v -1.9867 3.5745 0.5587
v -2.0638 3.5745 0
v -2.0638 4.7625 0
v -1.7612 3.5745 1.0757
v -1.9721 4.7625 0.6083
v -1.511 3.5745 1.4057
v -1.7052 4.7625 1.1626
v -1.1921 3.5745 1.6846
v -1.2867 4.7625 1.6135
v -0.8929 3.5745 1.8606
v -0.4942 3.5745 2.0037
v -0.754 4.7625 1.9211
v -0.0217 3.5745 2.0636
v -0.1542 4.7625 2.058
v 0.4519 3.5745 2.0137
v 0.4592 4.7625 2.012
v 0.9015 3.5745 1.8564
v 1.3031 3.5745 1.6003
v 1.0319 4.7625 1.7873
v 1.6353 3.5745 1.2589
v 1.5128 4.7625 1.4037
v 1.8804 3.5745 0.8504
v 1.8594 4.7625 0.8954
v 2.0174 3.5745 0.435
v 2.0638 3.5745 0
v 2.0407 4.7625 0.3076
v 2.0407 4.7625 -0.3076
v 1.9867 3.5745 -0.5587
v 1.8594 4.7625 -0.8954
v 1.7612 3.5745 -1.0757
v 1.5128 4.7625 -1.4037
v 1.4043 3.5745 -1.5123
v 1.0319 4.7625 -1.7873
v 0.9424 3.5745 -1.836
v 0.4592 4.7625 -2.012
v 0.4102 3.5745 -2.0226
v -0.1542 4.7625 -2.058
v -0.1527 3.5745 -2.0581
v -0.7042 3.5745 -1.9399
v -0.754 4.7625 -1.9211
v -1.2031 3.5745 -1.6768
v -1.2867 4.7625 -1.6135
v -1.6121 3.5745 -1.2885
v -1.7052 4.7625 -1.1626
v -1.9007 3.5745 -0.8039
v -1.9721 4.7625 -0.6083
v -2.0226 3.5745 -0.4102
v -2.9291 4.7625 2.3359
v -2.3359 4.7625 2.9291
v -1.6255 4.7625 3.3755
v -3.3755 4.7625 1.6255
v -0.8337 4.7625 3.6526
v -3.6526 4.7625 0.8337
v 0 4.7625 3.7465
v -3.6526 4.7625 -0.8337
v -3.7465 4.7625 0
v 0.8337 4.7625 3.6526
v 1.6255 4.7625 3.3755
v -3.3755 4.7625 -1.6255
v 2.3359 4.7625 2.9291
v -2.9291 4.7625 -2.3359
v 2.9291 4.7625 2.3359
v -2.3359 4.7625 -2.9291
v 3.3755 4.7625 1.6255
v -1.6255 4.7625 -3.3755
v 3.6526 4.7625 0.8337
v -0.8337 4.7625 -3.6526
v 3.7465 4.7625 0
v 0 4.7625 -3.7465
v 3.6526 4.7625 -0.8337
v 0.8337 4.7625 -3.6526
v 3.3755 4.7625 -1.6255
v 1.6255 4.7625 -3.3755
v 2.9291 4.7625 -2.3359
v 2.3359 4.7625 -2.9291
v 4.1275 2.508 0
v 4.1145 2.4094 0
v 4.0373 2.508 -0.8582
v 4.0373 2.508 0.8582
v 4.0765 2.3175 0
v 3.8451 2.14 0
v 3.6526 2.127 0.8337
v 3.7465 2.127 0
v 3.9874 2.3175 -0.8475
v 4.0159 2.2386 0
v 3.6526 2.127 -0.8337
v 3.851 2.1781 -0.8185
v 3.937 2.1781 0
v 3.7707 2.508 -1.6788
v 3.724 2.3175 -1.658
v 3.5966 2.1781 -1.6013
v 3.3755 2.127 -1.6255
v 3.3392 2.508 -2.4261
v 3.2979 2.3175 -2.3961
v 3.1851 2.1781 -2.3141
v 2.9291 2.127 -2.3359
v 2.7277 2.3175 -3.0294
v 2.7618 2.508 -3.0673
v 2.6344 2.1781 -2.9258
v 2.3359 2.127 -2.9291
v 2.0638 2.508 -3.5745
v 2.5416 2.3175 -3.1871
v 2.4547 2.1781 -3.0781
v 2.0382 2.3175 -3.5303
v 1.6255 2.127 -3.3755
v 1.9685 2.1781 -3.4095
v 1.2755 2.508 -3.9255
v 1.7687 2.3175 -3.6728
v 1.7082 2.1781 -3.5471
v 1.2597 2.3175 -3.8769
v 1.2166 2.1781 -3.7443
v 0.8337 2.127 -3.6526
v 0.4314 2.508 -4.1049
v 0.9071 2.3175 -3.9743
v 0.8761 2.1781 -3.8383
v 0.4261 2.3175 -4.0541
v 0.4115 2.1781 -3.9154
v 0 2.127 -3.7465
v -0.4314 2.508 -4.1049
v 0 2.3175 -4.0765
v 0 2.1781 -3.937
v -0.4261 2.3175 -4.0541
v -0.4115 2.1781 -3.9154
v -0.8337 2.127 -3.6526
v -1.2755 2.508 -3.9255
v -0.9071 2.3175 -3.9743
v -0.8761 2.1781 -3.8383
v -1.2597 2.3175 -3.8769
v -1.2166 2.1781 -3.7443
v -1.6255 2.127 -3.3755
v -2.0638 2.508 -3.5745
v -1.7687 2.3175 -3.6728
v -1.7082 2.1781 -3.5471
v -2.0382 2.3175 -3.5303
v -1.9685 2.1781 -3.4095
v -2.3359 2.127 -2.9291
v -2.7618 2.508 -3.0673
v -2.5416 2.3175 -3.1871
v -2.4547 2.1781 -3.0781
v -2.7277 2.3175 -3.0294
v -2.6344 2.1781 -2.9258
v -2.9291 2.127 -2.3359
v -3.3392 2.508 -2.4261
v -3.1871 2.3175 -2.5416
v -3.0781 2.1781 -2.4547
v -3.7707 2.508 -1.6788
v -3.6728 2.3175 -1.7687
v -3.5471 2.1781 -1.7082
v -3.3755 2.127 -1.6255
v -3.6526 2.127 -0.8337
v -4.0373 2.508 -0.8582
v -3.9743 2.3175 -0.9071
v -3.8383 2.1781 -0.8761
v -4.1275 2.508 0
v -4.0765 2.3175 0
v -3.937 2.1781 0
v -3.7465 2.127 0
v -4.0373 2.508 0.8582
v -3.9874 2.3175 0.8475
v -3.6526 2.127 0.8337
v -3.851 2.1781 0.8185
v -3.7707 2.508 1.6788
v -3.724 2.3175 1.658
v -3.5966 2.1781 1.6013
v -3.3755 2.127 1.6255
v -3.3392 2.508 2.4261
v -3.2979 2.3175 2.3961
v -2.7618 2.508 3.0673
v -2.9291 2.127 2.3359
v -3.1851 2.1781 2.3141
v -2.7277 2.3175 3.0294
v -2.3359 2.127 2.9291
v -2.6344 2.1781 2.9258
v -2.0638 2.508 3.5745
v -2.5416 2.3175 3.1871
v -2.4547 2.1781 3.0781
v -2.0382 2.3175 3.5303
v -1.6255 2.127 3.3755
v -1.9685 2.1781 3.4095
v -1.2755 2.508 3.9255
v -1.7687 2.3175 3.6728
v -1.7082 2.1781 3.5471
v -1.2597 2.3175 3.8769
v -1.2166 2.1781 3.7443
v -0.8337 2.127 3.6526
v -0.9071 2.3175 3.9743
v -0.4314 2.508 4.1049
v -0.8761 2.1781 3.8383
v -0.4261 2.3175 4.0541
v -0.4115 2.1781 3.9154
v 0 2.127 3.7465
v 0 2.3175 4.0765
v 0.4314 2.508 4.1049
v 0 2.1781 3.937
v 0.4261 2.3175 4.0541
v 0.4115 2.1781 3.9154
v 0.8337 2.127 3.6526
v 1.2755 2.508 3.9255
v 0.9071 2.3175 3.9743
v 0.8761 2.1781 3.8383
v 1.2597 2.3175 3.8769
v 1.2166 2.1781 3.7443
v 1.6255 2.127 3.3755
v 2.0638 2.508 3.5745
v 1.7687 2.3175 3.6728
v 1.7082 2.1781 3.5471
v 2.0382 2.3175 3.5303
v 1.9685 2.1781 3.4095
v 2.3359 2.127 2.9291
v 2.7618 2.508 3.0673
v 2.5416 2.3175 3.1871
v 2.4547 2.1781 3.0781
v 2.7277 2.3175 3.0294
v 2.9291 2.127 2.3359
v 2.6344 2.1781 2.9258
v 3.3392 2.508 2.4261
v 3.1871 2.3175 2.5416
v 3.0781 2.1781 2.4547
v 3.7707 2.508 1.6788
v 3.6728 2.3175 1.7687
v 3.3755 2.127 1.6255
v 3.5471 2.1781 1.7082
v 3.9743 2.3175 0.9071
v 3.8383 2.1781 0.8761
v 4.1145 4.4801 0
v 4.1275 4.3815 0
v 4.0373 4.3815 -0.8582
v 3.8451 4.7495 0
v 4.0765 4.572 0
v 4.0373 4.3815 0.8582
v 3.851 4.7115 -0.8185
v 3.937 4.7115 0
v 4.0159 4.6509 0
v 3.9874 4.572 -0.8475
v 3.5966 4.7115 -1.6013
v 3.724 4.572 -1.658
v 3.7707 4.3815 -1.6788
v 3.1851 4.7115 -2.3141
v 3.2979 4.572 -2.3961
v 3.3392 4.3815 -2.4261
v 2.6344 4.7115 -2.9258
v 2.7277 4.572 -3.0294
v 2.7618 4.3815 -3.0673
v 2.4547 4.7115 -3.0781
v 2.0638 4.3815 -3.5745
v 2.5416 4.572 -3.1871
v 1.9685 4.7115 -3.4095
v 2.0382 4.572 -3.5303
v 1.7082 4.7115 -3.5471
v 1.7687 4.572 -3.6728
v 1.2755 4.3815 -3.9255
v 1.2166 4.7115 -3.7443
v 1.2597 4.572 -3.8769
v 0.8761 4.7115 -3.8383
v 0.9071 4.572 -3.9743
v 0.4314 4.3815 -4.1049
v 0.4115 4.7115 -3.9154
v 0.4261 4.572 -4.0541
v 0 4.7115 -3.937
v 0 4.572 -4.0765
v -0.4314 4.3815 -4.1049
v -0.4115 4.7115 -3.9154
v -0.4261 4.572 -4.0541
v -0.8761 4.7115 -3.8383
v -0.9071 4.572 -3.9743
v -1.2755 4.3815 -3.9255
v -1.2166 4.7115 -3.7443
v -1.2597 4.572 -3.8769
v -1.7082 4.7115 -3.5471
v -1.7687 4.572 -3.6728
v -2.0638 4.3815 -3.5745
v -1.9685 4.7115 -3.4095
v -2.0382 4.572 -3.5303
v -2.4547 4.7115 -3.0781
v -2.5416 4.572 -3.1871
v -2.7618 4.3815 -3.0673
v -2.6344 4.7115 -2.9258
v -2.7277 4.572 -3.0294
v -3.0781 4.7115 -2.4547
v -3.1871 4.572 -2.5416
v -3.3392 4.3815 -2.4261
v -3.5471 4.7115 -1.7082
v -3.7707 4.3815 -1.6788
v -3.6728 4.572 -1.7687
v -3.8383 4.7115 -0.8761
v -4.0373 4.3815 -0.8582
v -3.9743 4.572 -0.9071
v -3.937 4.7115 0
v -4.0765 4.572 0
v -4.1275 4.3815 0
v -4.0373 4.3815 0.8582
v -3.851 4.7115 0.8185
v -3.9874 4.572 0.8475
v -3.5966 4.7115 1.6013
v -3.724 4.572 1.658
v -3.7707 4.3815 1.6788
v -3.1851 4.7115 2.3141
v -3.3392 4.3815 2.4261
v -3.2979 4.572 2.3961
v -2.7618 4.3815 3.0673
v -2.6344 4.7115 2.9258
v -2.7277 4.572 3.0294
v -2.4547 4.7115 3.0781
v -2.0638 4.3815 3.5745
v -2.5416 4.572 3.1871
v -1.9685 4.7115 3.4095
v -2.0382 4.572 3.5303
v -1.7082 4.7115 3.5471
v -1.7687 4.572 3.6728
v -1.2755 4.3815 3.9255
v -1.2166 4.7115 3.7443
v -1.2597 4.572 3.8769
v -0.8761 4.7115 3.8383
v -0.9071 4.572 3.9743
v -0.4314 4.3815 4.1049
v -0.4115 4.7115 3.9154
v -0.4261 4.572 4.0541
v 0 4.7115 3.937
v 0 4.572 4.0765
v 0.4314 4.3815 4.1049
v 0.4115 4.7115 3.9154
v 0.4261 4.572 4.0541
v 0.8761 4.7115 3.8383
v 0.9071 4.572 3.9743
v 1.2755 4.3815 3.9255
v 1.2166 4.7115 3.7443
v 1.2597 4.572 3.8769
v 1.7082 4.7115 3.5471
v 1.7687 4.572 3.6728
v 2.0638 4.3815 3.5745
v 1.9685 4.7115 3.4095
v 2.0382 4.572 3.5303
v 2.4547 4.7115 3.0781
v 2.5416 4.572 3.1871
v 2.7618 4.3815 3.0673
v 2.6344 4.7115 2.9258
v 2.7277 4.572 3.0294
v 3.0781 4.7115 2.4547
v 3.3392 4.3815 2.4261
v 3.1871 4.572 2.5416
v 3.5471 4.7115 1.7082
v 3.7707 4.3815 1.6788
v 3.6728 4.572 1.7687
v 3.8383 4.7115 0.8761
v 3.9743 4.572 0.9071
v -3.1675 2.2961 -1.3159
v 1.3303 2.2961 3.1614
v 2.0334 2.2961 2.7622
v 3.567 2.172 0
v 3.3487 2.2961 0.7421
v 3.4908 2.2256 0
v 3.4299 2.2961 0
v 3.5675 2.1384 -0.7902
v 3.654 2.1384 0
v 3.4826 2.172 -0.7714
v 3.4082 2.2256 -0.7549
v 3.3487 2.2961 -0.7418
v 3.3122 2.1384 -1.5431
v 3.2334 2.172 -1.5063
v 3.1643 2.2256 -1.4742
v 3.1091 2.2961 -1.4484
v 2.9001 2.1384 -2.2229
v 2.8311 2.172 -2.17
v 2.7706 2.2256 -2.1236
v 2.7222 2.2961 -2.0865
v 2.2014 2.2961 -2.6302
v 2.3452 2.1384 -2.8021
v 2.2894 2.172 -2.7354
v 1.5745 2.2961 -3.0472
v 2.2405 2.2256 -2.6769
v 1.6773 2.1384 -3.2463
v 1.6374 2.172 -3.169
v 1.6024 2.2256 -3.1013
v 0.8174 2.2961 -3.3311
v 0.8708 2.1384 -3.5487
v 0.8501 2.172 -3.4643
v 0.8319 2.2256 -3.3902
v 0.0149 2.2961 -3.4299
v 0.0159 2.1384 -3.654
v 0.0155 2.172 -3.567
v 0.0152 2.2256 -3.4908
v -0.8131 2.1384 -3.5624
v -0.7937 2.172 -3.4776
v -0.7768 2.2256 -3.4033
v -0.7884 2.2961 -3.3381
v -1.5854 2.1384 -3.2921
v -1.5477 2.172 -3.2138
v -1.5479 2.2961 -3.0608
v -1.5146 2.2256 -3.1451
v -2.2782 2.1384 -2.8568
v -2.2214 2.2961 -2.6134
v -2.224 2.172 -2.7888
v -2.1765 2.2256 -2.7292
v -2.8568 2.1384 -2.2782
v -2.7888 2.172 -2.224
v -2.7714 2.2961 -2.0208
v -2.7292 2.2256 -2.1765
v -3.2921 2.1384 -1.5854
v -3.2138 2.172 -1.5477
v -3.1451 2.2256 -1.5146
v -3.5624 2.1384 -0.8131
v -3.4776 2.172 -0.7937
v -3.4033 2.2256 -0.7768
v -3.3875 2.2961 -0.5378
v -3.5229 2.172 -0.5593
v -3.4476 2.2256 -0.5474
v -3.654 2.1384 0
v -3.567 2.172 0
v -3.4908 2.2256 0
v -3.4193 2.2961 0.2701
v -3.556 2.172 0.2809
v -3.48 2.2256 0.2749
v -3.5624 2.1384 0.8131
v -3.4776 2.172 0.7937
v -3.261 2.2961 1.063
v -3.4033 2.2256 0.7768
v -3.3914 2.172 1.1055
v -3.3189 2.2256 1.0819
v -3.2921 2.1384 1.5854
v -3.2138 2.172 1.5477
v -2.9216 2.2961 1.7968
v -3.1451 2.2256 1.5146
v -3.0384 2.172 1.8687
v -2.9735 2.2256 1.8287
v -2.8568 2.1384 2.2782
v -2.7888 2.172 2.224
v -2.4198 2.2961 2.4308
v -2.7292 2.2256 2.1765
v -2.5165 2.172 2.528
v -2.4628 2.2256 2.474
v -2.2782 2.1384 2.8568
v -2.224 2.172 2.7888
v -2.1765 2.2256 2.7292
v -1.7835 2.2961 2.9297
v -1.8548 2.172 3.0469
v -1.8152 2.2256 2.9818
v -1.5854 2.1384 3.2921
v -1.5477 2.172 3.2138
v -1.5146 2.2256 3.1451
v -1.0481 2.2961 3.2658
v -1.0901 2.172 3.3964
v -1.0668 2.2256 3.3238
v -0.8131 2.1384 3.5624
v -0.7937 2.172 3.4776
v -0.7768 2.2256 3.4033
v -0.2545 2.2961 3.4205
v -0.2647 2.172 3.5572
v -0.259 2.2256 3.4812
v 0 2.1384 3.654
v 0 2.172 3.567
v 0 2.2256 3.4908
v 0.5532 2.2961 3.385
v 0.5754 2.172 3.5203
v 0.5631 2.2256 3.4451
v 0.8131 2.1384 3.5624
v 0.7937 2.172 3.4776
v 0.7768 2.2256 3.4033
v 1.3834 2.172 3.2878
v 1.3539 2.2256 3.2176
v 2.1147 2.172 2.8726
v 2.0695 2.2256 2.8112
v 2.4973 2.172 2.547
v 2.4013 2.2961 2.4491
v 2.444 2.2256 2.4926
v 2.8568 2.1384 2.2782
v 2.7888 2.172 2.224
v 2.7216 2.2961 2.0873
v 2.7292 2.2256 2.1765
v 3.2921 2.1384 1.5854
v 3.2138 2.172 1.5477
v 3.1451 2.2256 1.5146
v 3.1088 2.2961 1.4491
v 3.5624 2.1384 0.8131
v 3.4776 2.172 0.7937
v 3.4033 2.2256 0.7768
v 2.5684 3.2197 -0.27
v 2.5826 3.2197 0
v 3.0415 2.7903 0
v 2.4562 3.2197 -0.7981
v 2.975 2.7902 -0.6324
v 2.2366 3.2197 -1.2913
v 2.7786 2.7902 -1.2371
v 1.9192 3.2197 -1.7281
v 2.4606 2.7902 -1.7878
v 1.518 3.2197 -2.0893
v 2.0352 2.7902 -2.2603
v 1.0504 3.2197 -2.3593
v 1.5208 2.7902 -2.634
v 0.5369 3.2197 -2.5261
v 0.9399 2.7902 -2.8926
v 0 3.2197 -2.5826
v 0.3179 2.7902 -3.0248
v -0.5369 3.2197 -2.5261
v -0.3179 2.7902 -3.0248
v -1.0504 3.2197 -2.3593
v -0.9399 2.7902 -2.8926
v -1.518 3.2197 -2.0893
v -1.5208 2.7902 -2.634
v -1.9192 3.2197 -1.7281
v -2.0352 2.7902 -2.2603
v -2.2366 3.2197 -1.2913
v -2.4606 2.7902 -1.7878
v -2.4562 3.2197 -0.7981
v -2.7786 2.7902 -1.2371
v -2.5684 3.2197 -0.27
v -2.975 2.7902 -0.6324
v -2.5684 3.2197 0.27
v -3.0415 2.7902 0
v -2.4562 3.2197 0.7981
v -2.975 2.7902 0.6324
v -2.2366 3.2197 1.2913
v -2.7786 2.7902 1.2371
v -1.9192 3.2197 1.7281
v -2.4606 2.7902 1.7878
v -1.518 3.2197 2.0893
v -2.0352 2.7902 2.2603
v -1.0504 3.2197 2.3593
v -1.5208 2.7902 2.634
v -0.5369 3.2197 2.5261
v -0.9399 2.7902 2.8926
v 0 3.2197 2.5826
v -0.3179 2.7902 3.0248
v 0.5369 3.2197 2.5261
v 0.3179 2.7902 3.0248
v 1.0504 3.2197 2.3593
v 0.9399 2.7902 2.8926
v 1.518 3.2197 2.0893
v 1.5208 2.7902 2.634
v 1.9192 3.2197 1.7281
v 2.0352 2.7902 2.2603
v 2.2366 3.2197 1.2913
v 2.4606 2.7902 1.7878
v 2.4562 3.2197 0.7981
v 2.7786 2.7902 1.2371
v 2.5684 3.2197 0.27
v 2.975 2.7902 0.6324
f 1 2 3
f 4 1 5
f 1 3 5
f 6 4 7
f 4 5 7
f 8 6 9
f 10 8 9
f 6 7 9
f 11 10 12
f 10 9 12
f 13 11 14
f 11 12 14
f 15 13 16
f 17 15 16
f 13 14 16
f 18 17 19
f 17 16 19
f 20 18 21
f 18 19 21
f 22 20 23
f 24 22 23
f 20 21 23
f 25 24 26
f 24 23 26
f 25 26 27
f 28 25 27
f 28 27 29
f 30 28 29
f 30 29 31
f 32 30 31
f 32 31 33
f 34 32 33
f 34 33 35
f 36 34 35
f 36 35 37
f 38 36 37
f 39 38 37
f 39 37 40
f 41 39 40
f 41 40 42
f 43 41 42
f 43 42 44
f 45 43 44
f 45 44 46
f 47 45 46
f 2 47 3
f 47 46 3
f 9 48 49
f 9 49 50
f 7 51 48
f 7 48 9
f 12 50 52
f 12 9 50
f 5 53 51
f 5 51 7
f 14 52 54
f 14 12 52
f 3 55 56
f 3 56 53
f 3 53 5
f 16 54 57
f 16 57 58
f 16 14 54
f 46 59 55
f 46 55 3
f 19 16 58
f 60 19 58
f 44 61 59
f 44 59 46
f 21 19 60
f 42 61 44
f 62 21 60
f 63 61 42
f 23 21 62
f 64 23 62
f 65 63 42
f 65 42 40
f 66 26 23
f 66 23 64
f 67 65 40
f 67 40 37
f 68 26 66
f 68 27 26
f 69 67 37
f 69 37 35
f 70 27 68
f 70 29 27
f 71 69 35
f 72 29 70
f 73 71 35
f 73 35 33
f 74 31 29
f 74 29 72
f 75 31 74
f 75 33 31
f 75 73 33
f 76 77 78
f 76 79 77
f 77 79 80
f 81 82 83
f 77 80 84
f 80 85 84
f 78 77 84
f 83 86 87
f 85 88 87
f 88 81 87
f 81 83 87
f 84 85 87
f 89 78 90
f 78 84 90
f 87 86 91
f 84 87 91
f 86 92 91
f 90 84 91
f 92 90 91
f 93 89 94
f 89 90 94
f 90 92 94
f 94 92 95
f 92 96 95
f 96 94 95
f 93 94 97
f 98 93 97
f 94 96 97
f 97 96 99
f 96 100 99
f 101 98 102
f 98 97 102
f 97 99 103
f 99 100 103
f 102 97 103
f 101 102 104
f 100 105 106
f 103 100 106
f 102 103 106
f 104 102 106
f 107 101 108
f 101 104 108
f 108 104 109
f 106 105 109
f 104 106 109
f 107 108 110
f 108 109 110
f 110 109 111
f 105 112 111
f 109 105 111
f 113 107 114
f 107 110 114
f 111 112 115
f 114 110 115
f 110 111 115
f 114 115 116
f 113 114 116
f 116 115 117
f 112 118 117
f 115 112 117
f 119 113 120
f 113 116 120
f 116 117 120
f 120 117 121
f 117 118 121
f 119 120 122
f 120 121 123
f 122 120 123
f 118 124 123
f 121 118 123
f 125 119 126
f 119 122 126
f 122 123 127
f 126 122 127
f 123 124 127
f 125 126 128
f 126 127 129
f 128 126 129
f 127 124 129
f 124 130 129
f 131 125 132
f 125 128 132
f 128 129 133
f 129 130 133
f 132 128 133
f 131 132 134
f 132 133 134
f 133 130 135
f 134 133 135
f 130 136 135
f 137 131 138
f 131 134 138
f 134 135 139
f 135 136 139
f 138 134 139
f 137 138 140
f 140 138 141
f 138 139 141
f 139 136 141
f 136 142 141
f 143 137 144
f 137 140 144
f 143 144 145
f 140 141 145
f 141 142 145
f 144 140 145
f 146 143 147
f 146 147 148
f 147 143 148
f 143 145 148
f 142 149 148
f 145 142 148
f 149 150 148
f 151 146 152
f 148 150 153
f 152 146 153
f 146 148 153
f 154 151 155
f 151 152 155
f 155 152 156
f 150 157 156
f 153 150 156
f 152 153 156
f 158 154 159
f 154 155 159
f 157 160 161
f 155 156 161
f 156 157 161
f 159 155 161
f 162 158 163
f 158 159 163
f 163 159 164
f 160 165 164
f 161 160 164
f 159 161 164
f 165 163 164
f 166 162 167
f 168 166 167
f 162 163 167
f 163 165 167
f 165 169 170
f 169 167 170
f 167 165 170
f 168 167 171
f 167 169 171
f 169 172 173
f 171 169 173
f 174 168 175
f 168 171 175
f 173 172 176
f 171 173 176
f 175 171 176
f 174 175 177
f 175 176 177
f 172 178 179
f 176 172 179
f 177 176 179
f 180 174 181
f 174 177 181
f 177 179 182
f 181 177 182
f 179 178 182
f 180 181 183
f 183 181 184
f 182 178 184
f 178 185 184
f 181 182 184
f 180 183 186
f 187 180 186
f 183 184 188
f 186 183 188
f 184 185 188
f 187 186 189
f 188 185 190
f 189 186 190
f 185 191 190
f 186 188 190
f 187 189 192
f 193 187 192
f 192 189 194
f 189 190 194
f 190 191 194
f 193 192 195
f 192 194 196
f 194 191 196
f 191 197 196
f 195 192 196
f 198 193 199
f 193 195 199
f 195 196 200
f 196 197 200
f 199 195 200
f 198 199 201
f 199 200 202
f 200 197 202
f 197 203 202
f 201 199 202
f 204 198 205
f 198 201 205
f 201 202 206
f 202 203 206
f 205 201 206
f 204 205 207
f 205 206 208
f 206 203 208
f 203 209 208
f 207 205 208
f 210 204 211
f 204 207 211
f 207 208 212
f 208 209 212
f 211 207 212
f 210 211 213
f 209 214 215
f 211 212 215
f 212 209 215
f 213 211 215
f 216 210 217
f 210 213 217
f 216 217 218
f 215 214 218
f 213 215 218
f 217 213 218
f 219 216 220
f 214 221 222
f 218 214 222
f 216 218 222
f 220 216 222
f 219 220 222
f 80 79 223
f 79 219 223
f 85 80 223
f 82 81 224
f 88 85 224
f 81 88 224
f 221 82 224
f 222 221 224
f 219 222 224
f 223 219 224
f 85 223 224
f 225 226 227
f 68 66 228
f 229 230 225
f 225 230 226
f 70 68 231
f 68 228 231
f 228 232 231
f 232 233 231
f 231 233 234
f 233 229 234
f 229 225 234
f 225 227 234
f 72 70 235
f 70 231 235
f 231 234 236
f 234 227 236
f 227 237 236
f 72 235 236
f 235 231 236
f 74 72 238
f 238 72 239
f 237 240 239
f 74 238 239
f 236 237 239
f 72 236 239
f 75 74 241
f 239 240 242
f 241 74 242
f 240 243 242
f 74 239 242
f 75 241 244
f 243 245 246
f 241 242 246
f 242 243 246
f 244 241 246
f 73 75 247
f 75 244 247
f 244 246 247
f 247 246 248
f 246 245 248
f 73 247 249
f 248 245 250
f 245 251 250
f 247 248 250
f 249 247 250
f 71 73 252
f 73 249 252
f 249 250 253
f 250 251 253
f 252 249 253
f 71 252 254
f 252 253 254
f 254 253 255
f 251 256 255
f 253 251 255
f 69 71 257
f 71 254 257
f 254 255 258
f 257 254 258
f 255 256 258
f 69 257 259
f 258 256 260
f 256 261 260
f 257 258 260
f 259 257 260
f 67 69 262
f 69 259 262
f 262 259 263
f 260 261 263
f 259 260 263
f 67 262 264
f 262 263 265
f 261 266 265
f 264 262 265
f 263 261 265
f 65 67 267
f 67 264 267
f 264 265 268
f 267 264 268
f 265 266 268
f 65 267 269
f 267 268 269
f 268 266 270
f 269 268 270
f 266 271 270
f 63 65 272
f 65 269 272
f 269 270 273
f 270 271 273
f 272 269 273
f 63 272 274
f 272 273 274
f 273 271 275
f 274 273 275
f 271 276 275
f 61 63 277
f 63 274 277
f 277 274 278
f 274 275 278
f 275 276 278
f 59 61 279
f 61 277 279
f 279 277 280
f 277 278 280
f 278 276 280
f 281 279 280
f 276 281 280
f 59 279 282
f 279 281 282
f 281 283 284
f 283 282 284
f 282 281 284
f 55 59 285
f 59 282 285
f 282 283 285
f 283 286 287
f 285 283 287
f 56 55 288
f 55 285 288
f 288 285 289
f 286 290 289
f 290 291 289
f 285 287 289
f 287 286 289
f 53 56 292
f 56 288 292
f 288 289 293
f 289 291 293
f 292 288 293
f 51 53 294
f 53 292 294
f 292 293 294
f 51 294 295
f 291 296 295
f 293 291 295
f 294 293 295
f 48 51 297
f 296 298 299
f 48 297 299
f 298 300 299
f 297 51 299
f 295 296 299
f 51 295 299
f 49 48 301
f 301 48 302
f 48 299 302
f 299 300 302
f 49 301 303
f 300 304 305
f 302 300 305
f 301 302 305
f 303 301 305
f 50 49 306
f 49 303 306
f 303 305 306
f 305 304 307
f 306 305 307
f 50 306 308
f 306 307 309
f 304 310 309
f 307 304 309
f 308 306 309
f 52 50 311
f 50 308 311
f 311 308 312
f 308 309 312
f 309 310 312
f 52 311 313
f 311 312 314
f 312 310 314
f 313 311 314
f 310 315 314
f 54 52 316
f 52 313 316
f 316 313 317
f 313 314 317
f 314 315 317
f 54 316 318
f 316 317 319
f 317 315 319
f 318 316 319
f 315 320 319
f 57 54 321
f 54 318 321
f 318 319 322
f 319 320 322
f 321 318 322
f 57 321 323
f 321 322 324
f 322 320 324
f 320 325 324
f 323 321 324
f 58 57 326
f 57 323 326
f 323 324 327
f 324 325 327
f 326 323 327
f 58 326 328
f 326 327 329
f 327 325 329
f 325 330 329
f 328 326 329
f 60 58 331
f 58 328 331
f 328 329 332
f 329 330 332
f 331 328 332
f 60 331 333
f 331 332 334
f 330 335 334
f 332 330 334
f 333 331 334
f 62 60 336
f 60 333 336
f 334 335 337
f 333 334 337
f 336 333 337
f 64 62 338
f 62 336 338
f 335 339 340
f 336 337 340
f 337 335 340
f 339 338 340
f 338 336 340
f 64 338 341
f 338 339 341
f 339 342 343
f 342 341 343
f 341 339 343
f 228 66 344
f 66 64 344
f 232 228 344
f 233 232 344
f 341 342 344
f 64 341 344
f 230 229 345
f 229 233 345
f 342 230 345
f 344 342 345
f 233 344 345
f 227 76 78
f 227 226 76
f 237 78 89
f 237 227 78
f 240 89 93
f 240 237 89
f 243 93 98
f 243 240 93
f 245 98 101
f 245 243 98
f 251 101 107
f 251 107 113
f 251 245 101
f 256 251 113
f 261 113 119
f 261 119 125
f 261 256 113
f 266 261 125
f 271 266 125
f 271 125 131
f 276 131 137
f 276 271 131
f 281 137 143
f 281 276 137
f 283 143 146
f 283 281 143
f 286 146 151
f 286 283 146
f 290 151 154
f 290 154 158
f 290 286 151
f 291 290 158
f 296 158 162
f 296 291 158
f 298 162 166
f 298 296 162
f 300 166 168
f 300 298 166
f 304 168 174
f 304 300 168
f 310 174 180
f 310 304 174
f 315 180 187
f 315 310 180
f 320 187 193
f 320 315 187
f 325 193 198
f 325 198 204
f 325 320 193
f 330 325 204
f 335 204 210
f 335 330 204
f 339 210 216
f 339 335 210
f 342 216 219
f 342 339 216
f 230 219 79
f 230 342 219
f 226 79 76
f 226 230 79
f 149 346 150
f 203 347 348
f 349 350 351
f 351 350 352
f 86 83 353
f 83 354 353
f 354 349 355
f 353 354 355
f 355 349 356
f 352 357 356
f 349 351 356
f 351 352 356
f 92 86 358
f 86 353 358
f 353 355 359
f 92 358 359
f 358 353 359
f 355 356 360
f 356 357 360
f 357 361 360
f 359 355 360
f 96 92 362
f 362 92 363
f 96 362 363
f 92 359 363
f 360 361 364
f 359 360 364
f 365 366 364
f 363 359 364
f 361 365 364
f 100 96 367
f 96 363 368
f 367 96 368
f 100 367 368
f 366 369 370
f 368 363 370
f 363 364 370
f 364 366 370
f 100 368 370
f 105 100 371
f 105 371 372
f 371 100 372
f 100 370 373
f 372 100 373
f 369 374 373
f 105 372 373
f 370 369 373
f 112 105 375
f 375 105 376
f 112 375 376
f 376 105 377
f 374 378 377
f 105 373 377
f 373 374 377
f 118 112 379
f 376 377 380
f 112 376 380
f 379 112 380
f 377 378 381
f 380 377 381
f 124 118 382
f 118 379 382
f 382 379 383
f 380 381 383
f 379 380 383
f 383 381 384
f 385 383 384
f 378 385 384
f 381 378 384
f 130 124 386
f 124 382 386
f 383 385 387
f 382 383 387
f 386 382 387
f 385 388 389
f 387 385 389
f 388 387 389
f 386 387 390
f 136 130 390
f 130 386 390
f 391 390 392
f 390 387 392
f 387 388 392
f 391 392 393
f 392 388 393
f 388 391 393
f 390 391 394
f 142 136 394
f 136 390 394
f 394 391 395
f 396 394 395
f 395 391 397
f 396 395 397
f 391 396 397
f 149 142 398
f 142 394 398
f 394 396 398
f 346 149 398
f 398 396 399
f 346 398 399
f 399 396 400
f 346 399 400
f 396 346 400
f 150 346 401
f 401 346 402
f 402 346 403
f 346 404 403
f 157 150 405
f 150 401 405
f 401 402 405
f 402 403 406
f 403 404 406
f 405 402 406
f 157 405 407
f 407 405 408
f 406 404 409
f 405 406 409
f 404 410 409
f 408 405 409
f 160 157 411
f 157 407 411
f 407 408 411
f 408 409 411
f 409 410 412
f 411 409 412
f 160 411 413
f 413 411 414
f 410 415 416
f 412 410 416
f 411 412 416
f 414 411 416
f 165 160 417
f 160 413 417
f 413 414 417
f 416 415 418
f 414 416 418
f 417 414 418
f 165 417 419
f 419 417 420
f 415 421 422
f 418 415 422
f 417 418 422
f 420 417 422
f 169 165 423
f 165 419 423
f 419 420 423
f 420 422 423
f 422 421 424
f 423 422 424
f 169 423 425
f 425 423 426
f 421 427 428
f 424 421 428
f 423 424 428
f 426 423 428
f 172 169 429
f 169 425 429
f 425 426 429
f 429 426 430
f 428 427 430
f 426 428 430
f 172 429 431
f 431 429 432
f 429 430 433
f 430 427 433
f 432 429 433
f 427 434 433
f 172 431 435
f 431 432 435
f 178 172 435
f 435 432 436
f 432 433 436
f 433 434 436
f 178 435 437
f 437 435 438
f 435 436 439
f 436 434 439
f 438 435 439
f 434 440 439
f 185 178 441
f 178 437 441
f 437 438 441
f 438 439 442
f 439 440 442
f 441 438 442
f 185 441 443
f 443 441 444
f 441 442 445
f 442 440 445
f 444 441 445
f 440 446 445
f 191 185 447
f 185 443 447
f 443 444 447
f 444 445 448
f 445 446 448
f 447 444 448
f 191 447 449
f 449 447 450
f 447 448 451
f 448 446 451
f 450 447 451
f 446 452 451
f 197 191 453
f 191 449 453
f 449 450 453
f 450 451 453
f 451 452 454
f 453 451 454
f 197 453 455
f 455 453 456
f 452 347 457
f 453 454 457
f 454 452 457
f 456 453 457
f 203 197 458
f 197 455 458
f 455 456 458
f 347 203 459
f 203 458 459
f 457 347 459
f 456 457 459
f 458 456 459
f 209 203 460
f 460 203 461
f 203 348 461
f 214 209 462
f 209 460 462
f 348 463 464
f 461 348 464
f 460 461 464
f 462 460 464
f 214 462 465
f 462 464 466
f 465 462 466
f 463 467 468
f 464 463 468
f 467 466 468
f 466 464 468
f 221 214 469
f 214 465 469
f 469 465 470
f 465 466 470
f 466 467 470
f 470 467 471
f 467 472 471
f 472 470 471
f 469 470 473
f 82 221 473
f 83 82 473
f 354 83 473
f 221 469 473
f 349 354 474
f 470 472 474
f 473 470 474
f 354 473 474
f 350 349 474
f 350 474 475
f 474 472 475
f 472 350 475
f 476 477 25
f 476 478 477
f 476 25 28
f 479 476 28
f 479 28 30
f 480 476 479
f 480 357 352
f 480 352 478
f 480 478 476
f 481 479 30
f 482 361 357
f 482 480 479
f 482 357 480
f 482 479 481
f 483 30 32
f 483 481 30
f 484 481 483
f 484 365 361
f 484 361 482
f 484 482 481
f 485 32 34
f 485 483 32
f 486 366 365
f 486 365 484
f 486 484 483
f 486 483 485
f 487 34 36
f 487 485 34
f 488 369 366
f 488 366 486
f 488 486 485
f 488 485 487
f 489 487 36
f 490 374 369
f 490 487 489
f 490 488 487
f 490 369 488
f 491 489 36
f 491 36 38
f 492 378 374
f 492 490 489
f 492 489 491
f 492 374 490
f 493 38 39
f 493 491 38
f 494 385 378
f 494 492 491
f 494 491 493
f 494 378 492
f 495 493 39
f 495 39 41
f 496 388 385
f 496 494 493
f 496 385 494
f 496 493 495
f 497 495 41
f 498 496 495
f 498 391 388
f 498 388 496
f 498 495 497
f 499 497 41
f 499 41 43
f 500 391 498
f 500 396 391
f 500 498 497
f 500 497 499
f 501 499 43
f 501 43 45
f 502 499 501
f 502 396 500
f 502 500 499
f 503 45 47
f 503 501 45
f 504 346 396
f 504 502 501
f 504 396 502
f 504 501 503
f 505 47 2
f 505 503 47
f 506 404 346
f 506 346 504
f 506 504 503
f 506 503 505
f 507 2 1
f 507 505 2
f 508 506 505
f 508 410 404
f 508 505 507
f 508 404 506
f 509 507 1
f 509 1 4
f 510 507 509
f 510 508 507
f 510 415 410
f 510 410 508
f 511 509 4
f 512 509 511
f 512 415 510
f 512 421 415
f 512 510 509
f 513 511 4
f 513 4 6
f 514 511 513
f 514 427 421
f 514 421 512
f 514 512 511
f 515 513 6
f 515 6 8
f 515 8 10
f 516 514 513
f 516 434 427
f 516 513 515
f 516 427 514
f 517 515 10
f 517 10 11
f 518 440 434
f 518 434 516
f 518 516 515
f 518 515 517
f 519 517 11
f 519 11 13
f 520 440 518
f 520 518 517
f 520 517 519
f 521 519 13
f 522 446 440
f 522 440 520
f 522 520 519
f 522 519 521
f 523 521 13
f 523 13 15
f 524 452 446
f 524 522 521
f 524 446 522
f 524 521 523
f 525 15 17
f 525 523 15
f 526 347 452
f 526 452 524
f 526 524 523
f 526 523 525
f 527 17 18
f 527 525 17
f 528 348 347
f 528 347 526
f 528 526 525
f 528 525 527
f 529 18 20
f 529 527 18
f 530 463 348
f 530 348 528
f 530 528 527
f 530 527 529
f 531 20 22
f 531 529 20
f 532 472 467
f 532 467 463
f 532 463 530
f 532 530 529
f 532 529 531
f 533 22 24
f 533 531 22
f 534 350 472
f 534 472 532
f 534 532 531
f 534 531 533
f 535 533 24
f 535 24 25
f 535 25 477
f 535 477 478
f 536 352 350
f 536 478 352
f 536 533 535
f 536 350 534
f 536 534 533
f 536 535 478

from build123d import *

# Parameters (mm, degrees)
SKETCH2_R          = 2.06375
CUT_EXTRUDE1_DEPTH = 7.404538696


with BuildPart() as part:
    # Sketch1 → Revolve1 (revolve)
    with BuildSketch(Plane.XY):
        with BuildLine():
            Line((4.1275, 0), (4.1275, 4.7625))
            Line((4.1275, 4.7625), (0, 4.7625))
            Line((0, 4.7625), (0, 4.1275))
            ThreePointArc((0, 4.1275), (2.918583239, 2.918583239), (4.1275, 0))
        make_face()
    revolve(axis=Axis((0, -74.223969944, 0), (0, 1, 0)))

    # Fillet1: read off the stored shape, not the designer's step
    # Fillet1 outline → Fillet1 (revolve, cut)
    with BuildSketch(Plane.XY):
        with BuildLine():
            Line((3.429894366, 2.127048943), (3.7465, 2.127049042))
            ThreePointArc((3.7465, 2.127049042), (3.567044036, 2.17195894), (3.429894366, 2.296101236))
            Line((3.429894366, 2.296101236), (3.429894366, 2.127048943))
        make_face()
        with BuildLine():
            Line((3.7465, 2.127049042), (4.1275, 2.127048943))
            Line((4.1275, 2.127048943), (4.1275, 2.508049043))
            ThreePointArc((4.1275, 2.508049043), (4.015907684, 2.238641359), (3.7465, 2.127049042))
        make_face()
        with BuildLine():
            ThreePointArc((3.7465, 4.7625), (4.015907684, 4.650907684), (4.1275, 4.3815))
            Line((4.1275, 4.3815), (4.1275, 4.7625))
            Line((4.1275, 4.7625), (3.7465, 4.7625))
        make_face()
    revolve(axis=Axis((0, 0, 0), (0, 1, 0)), mode=Mode.SUBTRACT)

    # Fillet1 2 outline → Fillet1 2 (revolve, cut)
    with BuildSketch(Plane.XY):
        with BuildLine():
            ThreePointArc((3.53721911, 2.127048947), (3.977192988, 1.103717438), (4.1275, -4e-09))
            Line((4.1275, -4e-09), (4.1275, 2.127048943))
            Line((4.1275, 2.127048943), (3.7465, 2.127049042))
            Line((3.7465, 2.127049042), (3.53721911, 2.127048947))
        make_face()
    revolve(axis=Axis((0, 0, 0), (0, 1, 0)), mode=Mode.SUBTRACT)

    # Sketch2 → Cut-Extrude1 (cut, through all)
    with BuildSketch(Plane(origin=(0, 4.7625, 0), x_dir=(1, 0, 0), z_dir=(0, 1, 0))):
        with Locations(Location((0, 0, 0), (0, 0, 180))):
            Circle(SKETCH2_R)
    extrude(amount=-CUT_EXTRUDE1_DEPTH, mode=Mode.SUBTRACT)


solid = part.part
